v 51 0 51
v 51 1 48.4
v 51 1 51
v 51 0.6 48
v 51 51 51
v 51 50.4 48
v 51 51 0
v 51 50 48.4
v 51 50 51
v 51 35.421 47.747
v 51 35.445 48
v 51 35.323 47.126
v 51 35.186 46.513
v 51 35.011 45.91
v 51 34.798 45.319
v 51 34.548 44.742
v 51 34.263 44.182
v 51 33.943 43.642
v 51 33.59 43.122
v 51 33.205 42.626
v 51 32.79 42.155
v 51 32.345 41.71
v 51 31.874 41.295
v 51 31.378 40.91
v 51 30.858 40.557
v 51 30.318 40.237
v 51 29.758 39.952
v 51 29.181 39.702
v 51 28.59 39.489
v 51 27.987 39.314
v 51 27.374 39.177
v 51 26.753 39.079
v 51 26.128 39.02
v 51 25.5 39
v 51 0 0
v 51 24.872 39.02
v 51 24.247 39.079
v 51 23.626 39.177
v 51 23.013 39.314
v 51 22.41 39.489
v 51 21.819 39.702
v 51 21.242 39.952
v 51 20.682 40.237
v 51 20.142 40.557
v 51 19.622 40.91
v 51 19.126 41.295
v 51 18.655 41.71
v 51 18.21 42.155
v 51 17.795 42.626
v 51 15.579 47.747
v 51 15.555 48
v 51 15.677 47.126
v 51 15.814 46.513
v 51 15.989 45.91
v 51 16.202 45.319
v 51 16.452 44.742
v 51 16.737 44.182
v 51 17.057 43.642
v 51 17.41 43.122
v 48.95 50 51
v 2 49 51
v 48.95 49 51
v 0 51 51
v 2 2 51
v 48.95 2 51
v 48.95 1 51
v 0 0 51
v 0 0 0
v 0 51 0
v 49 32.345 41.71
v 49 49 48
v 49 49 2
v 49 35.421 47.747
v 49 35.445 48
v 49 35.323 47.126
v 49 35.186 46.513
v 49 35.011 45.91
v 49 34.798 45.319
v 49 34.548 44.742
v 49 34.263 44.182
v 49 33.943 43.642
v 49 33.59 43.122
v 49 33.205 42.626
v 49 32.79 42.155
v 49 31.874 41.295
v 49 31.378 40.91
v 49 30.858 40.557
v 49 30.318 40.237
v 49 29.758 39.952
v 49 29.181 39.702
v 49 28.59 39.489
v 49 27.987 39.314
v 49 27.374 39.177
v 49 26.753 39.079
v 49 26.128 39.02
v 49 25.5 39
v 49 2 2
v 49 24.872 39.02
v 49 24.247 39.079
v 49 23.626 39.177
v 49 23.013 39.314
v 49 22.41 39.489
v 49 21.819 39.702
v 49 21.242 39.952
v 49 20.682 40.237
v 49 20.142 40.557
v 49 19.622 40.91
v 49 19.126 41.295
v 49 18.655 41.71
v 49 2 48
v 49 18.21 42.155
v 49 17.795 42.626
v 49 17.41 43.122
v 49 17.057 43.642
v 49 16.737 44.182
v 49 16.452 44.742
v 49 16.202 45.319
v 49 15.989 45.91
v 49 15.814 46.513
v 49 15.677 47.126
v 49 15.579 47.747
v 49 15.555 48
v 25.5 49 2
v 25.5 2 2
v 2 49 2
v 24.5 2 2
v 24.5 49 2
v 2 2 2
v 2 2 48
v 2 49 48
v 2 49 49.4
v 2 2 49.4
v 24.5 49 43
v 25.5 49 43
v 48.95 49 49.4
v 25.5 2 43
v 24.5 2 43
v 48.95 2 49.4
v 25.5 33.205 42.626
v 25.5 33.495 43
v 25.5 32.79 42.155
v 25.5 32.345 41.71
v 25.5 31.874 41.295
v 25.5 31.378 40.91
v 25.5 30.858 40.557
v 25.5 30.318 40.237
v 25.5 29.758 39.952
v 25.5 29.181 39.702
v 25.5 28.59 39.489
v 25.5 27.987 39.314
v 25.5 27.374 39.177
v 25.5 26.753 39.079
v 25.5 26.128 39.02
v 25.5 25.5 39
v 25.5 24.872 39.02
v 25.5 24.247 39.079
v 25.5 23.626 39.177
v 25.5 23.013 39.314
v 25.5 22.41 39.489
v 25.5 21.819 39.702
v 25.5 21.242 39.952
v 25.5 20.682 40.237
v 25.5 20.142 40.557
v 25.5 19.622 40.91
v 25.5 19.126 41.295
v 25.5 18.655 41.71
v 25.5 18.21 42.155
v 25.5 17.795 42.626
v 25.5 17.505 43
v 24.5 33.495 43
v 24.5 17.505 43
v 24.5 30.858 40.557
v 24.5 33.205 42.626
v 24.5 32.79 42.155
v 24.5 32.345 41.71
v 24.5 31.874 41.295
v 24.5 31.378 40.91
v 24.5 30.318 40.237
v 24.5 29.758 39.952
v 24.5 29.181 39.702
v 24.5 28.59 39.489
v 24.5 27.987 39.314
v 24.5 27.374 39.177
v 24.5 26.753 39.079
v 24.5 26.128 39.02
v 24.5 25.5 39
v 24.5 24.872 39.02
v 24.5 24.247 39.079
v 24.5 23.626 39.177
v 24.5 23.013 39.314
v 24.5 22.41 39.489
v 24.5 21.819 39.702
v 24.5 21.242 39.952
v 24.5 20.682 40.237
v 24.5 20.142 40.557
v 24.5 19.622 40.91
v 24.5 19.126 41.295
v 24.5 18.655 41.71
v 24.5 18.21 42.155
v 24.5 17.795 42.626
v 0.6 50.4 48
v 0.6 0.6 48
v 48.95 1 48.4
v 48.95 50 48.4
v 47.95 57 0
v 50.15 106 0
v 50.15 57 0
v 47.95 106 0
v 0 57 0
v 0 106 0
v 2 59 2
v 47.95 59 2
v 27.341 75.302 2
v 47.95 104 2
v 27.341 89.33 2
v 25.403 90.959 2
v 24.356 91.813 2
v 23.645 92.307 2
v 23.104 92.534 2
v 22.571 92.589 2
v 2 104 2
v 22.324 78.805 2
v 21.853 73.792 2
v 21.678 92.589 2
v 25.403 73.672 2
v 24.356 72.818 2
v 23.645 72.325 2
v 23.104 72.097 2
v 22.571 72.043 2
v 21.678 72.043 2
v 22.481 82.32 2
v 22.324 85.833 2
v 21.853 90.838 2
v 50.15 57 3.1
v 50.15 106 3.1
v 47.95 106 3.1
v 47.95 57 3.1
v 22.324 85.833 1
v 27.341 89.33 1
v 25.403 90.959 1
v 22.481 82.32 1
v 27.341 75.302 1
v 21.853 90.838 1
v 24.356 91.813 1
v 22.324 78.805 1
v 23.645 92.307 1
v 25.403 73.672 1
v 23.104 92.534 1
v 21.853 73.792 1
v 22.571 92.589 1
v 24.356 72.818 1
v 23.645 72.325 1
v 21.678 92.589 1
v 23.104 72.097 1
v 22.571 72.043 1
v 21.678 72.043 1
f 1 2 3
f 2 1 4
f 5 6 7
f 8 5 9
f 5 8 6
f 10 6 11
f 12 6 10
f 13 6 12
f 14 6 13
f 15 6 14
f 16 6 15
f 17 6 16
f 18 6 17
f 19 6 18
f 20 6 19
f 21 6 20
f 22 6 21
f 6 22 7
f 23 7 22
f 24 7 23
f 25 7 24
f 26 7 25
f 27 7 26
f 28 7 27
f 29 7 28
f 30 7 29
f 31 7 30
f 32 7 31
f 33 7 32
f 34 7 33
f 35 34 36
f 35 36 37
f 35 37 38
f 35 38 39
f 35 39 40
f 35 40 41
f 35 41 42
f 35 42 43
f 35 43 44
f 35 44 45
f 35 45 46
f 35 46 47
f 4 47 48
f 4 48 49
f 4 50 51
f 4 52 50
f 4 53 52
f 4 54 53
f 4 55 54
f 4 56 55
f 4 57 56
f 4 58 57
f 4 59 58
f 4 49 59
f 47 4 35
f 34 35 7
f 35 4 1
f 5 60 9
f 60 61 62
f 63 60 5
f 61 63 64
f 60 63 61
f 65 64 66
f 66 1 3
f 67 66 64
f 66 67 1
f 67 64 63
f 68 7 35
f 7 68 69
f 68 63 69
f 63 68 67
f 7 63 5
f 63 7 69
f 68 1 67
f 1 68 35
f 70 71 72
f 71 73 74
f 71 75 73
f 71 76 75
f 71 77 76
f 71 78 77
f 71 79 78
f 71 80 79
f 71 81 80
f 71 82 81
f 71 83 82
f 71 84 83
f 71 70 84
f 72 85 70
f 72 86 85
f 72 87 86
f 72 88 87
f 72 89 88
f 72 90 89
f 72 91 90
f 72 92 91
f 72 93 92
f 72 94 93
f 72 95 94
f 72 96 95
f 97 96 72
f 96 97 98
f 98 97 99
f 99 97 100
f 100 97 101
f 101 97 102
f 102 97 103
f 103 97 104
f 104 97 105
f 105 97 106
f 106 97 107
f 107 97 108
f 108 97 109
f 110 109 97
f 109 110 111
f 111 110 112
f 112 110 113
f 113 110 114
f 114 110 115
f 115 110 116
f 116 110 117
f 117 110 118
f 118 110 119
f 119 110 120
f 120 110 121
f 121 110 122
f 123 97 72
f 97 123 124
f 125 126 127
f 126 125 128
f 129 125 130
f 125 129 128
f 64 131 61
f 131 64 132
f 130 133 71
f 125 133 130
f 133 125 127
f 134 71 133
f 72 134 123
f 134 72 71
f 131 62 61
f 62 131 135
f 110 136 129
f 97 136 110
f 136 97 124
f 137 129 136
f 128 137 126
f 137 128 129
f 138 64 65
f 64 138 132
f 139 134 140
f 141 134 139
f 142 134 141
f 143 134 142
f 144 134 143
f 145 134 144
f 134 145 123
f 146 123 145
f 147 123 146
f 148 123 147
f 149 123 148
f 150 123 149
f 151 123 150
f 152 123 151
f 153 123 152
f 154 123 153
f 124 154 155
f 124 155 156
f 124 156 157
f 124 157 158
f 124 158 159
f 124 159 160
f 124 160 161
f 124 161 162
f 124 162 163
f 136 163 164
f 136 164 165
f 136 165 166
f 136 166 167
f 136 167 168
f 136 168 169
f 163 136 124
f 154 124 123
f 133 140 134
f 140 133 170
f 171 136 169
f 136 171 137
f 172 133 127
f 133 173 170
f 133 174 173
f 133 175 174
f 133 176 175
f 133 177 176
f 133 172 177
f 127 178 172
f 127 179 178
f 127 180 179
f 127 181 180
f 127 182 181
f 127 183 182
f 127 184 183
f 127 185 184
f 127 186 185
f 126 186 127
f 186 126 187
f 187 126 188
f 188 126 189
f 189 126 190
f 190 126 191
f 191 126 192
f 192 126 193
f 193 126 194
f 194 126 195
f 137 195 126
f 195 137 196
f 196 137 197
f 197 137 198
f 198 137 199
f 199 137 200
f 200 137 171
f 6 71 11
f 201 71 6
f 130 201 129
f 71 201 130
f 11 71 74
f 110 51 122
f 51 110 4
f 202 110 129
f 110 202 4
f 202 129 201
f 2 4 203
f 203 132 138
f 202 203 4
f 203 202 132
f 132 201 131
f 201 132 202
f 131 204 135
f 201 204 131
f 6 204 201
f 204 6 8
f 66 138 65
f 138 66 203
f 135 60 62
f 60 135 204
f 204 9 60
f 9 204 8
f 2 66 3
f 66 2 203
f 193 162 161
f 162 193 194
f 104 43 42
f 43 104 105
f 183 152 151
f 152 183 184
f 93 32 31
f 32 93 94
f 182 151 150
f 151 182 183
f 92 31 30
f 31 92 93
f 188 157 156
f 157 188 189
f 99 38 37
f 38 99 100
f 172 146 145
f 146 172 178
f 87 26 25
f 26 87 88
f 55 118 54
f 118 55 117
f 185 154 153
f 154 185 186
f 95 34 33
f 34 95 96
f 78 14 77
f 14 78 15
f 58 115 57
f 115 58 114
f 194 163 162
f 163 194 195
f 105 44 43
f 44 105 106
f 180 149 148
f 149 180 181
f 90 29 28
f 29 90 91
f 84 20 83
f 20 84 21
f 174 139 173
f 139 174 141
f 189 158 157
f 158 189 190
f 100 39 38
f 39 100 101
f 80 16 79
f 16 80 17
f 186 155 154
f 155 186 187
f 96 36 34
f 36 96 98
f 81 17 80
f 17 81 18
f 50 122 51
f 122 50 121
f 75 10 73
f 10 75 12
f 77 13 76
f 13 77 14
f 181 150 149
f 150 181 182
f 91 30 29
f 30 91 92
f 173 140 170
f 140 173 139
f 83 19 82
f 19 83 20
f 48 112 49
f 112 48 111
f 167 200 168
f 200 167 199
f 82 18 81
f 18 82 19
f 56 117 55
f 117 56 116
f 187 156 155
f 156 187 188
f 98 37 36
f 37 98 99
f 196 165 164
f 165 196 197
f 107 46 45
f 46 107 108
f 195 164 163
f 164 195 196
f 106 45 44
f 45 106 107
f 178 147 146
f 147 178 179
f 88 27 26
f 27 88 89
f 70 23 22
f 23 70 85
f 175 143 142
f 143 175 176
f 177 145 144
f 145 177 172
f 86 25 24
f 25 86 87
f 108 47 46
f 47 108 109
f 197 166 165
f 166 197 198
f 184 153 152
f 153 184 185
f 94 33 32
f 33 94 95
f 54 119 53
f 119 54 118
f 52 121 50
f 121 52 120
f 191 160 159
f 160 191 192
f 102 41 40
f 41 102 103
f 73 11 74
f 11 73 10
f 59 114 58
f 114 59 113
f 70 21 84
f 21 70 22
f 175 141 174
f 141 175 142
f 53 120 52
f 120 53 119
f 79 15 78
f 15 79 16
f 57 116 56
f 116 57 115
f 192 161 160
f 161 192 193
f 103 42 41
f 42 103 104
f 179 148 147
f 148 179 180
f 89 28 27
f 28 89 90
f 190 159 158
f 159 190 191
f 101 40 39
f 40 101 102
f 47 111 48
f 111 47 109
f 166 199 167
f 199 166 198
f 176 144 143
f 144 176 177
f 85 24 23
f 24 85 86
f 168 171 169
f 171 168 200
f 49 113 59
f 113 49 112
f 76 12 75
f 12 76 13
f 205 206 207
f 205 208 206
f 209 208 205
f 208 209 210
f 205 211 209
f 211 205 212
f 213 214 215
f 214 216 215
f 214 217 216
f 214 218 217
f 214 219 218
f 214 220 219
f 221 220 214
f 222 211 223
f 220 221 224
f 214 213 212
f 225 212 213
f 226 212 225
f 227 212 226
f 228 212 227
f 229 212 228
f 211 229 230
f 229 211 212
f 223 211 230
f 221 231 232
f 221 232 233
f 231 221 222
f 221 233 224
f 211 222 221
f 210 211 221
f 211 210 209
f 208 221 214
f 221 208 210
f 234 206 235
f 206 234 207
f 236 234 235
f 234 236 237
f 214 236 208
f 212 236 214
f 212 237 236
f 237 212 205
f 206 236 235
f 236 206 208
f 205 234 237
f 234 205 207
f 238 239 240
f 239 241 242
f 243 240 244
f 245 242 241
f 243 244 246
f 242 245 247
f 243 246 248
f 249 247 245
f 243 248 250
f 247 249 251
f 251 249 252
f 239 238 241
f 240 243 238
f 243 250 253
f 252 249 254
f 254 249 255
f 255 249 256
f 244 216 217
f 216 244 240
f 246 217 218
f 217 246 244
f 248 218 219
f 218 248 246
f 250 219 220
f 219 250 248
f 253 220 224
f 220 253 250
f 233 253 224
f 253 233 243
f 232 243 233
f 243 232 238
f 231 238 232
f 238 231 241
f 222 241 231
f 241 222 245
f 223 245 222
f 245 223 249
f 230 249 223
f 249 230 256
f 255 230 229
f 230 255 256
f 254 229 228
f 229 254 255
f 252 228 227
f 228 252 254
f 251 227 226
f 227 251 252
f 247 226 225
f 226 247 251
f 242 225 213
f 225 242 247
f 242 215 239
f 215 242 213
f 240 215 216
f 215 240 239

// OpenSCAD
// file: carcassonne_box.scad
/**
 * @file carcassonne_box.scad
 * @author Conlan Wesson
 * Template for Carcossonne boxes.
 * @copyright Creative Commons Attribution-NonCommercial-ShareAlike 4.0
 */

mm = 1;
cm = 10*mm;

width = 47*mm;
thick = 2.5*mm;
wall = 2*mm;

/**
 * Lid for box.
 * @param count Number of cards.
 * @param columns Number of columns.
 * @param icon Path to icon DXF file.
 * @param rot Icon rotation in degrees.
 * @param mult Icon scale.
 * @param xoff X-offset of icon from center.
 * @param yoff Y-offset of icon from center.
 */
module carcassonne_lid(count, columns=1, icon=false, rot=0, mult=1, xoff=0, yoff=0, g=0){
	length = (thick * count) + ((width/2) - ((thick * count) % (width/2)));
	w = length+(1.5*wall)+.1;
	l = (width*columns)+wall;
	h = wall;
	d = 2;

	CubePoints = [
		[ 0-g, 0-g,   0 ],  //0
		[ w+g, 0-g,   0 ],  //1
		[ w+g, l+g,   0 ],  //2
		[ 0-g, l+g,   0 ],  //3
		[   d,   d, h+g ],  //4
		[   w,   d, h+g ],  //5
		[   w, l-d, h+g ],  //6
		[   d, l-d, h+g ]   //7
	];
	
	CubeFaces = [
		[0,1,2,3],  // bottom
		[4,5,1,0],  // front
		[7,6,5,4],  // top
		[5,6,2,1],  // right
		[6,7,3,2],  // back
		[7,4,0,3]   // left
	];
	
	
	difference(){
		union(){
			polyhedron( CubePoints, CubeFaces );
			translate([w-wall-.15,0,0]) cube([wall+.2,l, (1.5*wall)+.1]);
		}
		if(icon){
			translate([w/2+xoff,l/3+yoff,h-(wall/2)]){
				linear_extrude(height=(wall)+.1){
					rotate(rot) scale(mult) import(icon);
				}
			}
		}
	}
}

/**
 * Carcassonne card box.
 * @param count Number of cards.
 * @param dividers Array of divider positions.
 * @param columns Number of columns.
 */
module carcassonne_box(count, dividers=[], columns=1){
	length = (thick * count) + ((width/2) - ((thick * count) % (width/2)));
	difference(){
		union(){
			difference(){
				// Outer walls
				cube([length+(2*wall), (width*columns)+(2*wall), width+(2*wall)]);
				// Cavity
				translate([wall, wall, wall]){
					cube([length, width*columns, (width+wall)+.1]);
				}
			}
			// Dividers
			for(col = [0:columns-1]){
				for(div = dividers[col]){
					translate([(div*(width/2))+(wall/2), width*col+wall, 0]) cube([wall/2, width, width-(2*wall)]);
				}
				if(col > 0){
					translate([0, width*col+(wall/2), 0]) cube([length+(2*wall), wall/2, width-(2*wall)]);
				}
			}
		}
		union(){
			// Notch
			for(col = [0:columns-1]){
				translate([wall, wall+(width*col), wall]){
					translate([0, width/2, width])
					rotate([0, 90, 0]){
						cylinder(r=10, h=length+(2*wall), $fn=100);
					}
				}
			}
			// Track
			translate([wall/2,wall/2,width+wall/2]) carcassonne_lid(count, columns, g=0.4);
		}
	}
}
// main file
/**
 * @file ferries.scad
 * @author Conlan Wesson
 * The Ferries Carcossonne box.
 * @copyright Creative Commons Attribution-NonCommercial-ShareAlike 4.0
 */

include <carcassonne_box.scad>

count = 16;
dividers = [[1]];
columns = 1;

carcassonne_box(count, dividers, columns);
translate([0,width*columns+10,0]) carcassonne_lid(count, columns, icon="ferries.dxf", rot=90, mult=0.6, xoff=5, yoff=-4);
